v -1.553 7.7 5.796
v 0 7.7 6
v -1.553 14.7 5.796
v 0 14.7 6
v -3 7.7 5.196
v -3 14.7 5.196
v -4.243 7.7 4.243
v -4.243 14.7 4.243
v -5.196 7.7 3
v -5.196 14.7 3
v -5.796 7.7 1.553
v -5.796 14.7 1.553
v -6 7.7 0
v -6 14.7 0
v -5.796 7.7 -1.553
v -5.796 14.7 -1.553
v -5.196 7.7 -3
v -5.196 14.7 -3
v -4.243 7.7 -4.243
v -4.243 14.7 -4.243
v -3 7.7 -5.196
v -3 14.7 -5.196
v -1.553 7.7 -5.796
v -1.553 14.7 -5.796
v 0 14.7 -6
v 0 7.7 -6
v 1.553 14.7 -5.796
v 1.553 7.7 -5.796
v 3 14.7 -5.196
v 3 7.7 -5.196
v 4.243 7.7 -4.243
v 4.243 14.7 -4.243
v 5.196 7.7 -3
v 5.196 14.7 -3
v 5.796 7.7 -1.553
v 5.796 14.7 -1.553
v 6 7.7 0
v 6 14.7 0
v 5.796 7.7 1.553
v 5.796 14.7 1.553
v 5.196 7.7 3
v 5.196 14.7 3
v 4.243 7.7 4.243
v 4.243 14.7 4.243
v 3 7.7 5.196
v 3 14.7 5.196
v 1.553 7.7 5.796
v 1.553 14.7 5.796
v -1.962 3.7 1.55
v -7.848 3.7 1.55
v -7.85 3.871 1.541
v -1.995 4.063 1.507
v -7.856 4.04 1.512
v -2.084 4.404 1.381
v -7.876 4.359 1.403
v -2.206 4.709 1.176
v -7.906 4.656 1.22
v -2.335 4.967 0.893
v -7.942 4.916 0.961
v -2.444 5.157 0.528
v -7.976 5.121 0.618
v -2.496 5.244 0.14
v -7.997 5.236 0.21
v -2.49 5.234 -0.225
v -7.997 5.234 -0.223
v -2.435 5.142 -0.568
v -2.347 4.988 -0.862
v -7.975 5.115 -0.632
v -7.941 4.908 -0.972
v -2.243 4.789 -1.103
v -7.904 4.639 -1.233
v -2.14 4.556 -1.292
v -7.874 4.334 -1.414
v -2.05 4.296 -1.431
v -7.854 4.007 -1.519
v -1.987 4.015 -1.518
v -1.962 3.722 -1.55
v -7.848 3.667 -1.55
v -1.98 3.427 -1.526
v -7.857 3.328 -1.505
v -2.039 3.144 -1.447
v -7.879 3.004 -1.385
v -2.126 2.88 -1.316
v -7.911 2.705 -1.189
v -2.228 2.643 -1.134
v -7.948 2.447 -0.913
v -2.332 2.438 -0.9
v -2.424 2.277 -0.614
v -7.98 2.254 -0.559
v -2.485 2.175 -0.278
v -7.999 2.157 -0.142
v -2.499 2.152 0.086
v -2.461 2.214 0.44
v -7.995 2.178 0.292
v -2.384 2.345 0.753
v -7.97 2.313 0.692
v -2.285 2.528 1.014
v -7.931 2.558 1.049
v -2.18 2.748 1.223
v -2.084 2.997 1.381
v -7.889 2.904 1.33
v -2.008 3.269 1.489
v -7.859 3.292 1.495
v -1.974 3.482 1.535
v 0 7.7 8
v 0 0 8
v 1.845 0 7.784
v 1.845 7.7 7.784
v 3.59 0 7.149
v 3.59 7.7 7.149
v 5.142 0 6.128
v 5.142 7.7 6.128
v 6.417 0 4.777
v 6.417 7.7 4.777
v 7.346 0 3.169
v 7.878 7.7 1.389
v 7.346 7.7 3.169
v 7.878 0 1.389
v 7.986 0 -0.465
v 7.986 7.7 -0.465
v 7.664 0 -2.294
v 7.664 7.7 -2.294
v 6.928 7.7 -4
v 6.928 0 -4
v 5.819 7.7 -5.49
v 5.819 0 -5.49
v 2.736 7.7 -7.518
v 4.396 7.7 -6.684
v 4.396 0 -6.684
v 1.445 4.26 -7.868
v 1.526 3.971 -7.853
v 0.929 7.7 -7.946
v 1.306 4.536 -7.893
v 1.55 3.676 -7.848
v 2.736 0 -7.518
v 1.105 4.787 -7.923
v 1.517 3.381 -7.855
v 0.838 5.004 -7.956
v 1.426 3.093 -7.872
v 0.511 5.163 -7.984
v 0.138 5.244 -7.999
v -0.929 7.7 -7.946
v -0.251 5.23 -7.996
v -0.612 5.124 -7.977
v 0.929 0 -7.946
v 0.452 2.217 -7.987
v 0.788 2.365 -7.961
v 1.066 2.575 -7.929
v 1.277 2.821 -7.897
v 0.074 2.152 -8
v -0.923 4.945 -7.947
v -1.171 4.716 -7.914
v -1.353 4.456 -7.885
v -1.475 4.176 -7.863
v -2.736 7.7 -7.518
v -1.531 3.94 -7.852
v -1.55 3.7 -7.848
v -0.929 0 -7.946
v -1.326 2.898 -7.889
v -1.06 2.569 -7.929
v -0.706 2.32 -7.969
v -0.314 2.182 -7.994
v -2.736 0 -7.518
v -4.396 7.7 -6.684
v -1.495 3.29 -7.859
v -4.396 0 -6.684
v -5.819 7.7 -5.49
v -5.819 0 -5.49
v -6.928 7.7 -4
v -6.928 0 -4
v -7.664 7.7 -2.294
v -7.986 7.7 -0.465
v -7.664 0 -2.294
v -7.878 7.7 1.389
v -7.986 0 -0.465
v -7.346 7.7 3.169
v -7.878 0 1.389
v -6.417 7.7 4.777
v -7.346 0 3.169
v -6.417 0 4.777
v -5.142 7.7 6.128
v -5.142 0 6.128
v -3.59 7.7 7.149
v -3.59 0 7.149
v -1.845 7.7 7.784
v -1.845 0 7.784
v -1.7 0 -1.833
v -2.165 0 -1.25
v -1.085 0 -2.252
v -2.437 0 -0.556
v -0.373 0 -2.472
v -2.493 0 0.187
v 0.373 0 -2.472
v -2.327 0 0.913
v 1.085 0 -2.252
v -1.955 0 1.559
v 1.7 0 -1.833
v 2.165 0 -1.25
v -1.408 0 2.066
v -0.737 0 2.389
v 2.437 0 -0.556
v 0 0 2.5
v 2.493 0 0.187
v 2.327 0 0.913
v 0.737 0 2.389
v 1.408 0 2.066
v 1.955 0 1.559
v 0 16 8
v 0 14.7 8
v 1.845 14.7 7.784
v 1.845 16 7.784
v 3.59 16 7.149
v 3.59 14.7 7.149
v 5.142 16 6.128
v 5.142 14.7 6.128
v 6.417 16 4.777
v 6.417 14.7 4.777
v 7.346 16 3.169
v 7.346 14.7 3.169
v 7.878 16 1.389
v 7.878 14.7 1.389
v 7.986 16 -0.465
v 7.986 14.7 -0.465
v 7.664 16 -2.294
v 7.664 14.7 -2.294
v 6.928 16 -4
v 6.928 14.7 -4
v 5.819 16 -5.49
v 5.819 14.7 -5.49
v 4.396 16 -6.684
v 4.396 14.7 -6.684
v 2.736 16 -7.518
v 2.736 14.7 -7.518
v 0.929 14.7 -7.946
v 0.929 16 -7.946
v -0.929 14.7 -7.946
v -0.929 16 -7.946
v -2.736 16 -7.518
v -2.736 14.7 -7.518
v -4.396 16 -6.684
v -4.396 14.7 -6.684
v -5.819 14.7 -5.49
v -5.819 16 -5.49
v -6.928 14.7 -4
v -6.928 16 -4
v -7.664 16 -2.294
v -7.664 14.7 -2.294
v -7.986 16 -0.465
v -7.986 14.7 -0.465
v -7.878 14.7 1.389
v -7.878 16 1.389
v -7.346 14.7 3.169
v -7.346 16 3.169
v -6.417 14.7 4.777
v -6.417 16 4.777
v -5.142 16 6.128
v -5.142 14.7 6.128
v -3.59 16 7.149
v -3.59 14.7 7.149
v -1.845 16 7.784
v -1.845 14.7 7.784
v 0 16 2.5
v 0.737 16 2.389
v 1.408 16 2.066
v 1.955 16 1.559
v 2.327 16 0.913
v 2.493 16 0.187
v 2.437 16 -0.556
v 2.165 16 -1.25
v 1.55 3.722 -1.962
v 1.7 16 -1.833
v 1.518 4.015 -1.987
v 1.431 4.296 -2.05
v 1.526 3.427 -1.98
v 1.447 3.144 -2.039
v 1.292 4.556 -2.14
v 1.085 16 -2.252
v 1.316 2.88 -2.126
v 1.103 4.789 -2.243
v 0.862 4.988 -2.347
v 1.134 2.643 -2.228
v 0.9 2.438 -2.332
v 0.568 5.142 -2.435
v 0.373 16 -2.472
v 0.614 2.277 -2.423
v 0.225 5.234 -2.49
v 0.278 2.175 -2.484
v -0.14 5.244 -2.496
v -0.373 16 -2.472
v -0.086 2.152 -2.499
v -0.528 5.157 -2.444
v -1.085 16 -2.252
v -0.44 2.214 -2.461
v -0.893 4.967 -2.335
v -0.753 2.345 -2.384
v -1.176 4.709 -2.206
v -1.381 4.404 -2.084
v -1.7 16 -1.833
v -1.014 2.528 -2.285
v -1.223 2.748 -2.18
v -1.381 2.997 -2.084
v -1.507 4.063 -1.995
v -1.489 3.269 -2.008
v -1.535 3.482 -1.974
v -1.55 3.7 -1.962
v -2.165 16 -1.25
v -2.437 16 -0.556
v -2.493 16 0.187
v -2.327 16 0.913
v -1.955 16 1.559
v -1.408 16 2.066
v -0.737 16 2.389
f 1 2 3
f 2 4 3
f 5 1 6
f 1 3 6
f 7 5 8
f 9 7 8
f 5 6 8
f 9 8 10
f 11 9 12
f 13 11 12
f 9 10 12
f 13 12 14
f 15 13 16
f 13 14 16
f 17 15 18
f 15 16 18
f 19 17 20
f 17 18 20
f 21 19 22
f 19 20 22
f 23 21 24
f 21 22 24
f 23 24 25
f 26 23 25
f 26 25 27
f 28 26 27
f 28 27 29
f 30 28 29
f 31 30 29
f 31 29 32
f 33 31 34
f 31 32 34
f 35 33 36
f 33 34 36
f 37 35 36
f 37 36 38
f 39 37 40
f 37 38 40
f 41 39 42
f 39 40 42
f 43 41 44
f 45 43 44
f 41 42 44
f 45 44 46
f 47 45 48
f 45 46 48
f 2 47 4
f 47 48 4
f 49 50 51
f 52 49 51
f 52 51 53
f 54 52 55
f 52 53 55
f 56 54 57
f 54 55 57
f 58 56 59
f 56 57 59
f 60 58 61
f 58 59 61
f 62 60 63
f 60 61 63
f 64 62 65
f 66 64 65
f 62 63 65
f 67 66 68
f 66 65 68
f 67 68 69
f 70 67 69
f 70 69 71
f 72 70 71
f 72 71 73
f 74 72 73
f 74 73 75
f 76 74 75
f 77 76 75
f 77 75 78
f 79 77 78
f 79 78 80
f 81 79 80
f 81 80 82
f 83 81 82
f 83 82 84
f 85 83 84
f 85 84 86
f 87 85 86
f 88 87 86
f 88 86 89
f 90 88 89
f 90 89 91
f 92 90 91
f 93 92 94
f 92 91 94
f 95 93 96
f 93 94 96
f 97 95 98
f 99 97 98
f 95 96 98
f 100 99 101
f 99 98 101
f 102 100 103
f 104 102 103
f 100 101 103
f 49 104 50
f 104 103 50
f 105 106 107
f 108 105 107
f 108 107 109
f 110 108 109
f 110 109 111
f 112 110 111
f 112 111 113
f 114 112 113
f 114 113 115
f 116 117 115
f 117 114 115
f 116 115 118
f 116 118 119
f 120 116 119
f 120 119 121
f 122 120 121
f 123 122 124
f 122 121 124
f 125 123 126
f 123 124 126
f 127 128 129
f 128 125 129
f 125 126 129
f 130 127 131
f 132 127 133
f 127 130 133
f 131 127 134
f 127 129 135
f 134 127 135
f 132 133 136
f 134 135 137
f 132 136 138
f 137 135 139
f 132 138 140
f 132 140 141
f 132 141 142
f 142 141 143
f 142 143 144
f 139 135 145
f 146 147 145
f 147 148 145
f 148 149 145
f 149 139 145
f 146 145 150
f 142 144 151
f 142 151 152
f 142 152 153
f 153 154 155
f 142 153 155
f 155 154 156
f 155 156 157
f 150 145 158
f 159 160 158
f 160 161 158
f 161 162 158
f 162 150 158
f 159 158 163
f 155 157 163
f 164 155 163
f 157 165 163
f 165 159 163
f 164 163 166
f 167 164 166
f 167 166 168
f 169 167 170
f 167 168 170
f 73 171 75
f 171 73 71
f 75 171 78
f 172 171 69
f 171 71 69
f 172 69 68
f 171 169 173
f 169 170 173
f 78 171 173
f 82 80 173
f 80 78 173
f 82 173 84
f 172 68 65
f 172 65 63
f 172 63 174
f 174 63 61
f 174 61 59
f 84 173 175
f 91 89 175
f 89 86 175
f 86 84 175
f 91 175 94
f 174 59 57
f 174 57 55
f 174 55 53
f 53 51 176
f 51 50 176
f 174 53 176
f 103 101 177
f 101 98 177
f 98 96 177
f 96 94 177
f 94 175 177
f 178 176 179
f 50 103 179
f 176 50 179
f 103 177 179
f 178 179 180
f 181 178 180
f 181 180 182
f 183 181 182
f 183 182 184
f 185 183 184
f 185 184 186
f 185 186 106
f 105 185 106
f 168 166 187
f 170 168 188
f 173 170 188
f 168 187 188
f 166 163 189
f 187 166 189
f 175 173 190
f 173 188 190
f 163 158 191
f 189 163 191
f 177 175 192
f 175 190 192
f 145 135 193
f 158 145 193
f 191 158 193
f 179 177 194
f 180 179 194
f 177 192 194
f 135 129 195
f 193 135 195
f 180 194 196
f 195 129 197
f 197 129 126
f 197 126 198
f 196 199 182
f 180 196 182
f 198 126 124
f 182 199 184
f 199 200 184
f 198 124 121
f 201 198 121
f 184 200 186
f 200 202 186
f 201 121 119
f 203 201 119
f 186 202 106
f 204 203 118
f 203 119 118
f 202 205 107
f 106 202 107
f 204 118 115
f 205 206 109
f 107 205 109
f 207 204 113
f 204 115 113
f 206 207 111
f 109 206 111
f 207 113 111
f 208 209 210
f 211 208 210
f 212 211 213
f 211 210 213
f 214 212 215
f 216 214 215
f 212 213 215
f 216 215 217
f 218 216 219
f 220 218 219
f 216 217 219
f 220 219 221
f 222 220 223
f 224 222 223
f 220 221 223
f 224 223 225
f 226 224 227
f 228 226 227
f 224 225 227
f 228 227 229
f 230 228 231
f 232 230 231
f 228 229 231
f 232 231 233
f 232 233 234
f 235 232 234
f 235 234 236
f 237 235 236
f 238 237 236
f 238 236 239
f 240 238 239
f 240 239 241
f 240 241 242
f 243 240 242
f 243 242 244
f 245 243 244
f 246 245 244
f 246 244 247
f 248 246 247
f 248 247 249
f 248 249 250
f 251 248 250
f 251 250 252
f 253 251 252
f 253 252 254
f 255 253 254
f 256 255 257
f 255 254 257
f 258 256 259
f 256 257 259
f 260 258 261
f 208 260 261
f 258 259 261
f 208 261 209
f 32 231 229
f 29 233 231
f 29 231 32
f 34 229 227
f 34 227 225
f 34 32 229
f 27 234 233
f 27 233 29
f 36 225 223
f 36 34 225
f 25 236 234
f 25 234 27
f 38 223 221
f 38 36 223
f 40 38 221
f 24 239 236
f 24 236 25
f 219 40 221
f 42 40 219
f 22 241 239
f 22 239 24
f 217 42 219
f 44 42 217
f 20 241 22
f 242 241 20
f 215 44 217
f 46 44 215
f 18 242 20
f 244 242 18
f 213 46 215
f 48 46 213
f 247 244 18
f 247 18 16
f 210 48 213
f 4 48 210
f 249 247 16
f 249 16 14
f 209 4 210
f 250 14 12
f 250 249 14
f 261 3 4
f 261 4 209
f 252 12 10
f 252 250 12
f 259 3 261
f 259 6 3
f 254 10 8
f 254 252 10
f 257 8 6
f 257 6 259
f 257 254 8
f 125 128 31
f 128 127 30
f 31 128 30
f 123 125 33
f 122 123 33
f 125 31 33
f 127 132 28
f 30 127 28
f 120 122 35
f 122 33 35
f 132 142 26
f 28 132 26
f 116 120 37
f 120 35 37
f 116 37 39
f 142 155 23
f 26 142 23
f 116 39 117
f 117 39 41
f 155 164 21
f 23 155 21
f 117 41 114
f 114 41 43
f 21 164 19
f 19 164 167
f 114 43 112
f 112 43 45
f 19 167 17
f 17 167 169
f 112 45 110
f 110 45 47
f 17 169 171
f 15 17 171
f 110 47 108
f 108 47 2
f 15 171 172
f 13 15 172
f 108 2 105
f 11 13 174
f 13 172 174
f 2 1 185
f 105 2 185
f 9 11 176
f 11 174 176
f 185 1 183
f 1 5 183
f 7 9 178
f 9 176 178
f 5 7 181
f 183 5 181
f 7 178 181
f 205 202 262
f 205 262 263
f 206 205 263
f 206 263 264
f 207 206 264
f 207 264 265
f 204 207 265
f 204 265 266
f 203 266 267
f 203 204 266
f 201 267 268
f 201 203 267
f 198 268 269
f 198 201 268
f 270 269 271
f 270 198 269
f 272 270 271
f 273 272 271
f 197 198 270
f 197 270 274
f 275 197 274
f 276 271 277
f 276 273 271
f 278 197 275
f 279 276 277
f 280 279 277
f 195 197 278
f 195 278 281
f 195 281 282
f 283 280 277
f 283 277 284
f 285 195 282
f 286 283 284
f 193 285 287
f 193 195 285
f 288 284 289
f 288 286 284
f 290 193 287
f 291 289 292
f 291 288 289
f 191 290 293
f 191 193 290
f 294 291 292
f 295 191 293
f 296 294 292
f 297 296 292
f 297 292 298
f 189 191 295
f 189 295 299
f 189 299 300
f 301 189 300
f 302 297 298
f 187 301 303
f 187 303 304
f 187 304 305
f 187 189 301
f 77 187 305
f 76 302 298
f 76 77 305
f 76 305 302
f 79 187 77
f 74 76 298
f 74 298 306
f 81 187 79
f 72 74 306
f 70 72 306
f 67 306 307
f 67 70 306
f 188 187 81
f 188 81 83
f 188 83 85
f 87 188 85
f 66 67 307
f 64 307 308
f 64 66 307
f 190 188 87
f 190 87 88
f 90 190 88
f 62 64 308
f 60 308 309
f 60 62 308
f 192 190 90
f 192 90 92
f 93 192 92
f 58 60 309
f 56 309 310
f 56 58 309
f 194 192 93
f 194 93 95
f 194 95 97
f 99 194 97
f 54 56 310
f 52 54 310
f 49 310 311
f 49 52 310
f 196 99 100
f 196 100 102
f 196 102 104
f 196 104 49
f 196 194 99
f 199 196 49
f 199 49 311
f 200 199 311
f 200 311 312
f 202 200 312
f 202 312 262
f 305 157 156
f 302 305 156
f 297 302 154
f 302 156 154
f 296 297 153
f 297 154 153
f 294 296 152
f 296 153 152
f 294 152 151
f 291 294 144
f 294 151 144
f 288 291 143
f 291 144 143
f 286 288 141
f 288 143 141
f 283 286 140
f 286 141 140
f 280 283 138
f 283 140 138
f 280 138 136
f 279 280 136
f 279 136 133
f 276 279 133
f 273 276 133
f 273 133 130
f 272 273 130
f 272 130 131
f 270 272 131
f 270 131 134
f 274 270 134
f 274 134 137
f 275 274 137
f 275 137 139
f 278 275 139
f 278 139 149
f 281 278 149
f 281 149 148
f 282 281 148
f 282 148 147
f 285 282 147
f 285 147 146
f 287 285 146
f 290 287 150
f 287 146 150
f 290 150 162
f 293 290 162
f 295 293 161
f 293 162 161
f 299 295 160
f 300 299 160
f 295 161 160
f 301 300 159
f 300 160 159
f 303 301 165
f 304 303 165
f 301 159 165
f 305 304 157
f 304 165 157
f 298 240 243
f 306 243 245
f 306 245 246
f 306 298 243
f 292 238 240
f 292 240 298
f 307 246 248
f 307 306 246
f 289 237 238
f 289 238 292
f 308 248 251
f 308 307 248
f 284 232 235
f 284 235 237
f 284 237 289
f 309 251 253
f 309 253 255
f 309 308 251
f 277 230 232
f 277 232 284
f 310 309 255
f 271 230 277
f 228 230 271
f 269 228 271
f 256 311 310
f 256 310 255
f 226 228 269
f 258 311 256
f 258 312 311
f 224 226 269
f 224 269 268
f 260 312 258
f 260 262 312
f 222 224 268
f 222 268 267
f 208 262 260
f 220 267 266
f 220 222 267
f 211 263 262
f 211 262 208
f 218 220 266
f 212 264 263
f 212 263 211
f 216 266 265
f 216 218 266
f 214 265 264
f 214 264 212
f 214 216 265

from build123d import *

# Parameters (mm, degrees)
SKETCH1_R           = 8
SKETCH1_R_2         = 2.5
BOSS_EXTRUDE1_DEPTH = 16
SKETCH2_W           = 2
SKETCH2_H           = 7
SKETCH3_R           = 1.55
CUT_EXTRUDE1_DEPTH  = 8
CIRPATTERN1_COUNT   = 2
CIRPATTERN1_ANGLE   = 90


with BuildPart() as part:
    # Sketch1 → Boss-Extrude1 (new body)
    with BuildSketch(Plane(origin=(0, 0, 0), x_dir=(1, 0, 0), z_dir=(0, 1, 0))):
        with Locations(Location((0, 0, 0), (0, 0, 270))):
            Circle(SKETCH1_R)
        with Locations(Location((0, 0, 0), (0, 0, 270))):
            Circle(SKETCH1_R_2, mode=Mode.SUBTRACT)
    extrude(amount=BOSS_EXTRUDE1_DEPTH)

    # Sketch2 → Cut-Revolve1 (revolve, cut)
    with BuildSketch(Plane.XY, mode=Mode.PRIVATE) as cut_revolve1_sk:
        with Locations((-7, 11.2)):
            Rectangle(SKETCH2_W, SKETCH2_H)
    revolve(cut_revolve1_sk.sketch.rotate(Axis((0, 16.938378215, 0), (0, -1, 0)), 270), axis=Axis((0, 16.938378215, 0), (0, -1, 0)), mode=Mode.SUBTRACT)

    # Sketch3 → Cut-Extrude1 (cut)
    with BuildSketch(Plane.ZY.offset(8)):
        with Locations((0, 3.7)):
            Circle(SKETCH3_R)
    cut_extrude1 = extrude(amount=-CUT_EXTRUDE1_DEPTH, mode=Mode.SUBTRACT)

    # CirPattern1: Cut-Extrude1 ×2 about axis
    cirpattern1_axis = Axis((0, 16, 0), (0, -1, 0))
    for i in range(1, CIRPATTERN1_COUNT):
        add(cut_extrude1.rotate(cirpattern1_axis, i * CIRPATTERN1_ANGLE / (CIRPATTERN1_COUNT - 1)), mode=Mode.SUBTRACT)


solid = part.part
